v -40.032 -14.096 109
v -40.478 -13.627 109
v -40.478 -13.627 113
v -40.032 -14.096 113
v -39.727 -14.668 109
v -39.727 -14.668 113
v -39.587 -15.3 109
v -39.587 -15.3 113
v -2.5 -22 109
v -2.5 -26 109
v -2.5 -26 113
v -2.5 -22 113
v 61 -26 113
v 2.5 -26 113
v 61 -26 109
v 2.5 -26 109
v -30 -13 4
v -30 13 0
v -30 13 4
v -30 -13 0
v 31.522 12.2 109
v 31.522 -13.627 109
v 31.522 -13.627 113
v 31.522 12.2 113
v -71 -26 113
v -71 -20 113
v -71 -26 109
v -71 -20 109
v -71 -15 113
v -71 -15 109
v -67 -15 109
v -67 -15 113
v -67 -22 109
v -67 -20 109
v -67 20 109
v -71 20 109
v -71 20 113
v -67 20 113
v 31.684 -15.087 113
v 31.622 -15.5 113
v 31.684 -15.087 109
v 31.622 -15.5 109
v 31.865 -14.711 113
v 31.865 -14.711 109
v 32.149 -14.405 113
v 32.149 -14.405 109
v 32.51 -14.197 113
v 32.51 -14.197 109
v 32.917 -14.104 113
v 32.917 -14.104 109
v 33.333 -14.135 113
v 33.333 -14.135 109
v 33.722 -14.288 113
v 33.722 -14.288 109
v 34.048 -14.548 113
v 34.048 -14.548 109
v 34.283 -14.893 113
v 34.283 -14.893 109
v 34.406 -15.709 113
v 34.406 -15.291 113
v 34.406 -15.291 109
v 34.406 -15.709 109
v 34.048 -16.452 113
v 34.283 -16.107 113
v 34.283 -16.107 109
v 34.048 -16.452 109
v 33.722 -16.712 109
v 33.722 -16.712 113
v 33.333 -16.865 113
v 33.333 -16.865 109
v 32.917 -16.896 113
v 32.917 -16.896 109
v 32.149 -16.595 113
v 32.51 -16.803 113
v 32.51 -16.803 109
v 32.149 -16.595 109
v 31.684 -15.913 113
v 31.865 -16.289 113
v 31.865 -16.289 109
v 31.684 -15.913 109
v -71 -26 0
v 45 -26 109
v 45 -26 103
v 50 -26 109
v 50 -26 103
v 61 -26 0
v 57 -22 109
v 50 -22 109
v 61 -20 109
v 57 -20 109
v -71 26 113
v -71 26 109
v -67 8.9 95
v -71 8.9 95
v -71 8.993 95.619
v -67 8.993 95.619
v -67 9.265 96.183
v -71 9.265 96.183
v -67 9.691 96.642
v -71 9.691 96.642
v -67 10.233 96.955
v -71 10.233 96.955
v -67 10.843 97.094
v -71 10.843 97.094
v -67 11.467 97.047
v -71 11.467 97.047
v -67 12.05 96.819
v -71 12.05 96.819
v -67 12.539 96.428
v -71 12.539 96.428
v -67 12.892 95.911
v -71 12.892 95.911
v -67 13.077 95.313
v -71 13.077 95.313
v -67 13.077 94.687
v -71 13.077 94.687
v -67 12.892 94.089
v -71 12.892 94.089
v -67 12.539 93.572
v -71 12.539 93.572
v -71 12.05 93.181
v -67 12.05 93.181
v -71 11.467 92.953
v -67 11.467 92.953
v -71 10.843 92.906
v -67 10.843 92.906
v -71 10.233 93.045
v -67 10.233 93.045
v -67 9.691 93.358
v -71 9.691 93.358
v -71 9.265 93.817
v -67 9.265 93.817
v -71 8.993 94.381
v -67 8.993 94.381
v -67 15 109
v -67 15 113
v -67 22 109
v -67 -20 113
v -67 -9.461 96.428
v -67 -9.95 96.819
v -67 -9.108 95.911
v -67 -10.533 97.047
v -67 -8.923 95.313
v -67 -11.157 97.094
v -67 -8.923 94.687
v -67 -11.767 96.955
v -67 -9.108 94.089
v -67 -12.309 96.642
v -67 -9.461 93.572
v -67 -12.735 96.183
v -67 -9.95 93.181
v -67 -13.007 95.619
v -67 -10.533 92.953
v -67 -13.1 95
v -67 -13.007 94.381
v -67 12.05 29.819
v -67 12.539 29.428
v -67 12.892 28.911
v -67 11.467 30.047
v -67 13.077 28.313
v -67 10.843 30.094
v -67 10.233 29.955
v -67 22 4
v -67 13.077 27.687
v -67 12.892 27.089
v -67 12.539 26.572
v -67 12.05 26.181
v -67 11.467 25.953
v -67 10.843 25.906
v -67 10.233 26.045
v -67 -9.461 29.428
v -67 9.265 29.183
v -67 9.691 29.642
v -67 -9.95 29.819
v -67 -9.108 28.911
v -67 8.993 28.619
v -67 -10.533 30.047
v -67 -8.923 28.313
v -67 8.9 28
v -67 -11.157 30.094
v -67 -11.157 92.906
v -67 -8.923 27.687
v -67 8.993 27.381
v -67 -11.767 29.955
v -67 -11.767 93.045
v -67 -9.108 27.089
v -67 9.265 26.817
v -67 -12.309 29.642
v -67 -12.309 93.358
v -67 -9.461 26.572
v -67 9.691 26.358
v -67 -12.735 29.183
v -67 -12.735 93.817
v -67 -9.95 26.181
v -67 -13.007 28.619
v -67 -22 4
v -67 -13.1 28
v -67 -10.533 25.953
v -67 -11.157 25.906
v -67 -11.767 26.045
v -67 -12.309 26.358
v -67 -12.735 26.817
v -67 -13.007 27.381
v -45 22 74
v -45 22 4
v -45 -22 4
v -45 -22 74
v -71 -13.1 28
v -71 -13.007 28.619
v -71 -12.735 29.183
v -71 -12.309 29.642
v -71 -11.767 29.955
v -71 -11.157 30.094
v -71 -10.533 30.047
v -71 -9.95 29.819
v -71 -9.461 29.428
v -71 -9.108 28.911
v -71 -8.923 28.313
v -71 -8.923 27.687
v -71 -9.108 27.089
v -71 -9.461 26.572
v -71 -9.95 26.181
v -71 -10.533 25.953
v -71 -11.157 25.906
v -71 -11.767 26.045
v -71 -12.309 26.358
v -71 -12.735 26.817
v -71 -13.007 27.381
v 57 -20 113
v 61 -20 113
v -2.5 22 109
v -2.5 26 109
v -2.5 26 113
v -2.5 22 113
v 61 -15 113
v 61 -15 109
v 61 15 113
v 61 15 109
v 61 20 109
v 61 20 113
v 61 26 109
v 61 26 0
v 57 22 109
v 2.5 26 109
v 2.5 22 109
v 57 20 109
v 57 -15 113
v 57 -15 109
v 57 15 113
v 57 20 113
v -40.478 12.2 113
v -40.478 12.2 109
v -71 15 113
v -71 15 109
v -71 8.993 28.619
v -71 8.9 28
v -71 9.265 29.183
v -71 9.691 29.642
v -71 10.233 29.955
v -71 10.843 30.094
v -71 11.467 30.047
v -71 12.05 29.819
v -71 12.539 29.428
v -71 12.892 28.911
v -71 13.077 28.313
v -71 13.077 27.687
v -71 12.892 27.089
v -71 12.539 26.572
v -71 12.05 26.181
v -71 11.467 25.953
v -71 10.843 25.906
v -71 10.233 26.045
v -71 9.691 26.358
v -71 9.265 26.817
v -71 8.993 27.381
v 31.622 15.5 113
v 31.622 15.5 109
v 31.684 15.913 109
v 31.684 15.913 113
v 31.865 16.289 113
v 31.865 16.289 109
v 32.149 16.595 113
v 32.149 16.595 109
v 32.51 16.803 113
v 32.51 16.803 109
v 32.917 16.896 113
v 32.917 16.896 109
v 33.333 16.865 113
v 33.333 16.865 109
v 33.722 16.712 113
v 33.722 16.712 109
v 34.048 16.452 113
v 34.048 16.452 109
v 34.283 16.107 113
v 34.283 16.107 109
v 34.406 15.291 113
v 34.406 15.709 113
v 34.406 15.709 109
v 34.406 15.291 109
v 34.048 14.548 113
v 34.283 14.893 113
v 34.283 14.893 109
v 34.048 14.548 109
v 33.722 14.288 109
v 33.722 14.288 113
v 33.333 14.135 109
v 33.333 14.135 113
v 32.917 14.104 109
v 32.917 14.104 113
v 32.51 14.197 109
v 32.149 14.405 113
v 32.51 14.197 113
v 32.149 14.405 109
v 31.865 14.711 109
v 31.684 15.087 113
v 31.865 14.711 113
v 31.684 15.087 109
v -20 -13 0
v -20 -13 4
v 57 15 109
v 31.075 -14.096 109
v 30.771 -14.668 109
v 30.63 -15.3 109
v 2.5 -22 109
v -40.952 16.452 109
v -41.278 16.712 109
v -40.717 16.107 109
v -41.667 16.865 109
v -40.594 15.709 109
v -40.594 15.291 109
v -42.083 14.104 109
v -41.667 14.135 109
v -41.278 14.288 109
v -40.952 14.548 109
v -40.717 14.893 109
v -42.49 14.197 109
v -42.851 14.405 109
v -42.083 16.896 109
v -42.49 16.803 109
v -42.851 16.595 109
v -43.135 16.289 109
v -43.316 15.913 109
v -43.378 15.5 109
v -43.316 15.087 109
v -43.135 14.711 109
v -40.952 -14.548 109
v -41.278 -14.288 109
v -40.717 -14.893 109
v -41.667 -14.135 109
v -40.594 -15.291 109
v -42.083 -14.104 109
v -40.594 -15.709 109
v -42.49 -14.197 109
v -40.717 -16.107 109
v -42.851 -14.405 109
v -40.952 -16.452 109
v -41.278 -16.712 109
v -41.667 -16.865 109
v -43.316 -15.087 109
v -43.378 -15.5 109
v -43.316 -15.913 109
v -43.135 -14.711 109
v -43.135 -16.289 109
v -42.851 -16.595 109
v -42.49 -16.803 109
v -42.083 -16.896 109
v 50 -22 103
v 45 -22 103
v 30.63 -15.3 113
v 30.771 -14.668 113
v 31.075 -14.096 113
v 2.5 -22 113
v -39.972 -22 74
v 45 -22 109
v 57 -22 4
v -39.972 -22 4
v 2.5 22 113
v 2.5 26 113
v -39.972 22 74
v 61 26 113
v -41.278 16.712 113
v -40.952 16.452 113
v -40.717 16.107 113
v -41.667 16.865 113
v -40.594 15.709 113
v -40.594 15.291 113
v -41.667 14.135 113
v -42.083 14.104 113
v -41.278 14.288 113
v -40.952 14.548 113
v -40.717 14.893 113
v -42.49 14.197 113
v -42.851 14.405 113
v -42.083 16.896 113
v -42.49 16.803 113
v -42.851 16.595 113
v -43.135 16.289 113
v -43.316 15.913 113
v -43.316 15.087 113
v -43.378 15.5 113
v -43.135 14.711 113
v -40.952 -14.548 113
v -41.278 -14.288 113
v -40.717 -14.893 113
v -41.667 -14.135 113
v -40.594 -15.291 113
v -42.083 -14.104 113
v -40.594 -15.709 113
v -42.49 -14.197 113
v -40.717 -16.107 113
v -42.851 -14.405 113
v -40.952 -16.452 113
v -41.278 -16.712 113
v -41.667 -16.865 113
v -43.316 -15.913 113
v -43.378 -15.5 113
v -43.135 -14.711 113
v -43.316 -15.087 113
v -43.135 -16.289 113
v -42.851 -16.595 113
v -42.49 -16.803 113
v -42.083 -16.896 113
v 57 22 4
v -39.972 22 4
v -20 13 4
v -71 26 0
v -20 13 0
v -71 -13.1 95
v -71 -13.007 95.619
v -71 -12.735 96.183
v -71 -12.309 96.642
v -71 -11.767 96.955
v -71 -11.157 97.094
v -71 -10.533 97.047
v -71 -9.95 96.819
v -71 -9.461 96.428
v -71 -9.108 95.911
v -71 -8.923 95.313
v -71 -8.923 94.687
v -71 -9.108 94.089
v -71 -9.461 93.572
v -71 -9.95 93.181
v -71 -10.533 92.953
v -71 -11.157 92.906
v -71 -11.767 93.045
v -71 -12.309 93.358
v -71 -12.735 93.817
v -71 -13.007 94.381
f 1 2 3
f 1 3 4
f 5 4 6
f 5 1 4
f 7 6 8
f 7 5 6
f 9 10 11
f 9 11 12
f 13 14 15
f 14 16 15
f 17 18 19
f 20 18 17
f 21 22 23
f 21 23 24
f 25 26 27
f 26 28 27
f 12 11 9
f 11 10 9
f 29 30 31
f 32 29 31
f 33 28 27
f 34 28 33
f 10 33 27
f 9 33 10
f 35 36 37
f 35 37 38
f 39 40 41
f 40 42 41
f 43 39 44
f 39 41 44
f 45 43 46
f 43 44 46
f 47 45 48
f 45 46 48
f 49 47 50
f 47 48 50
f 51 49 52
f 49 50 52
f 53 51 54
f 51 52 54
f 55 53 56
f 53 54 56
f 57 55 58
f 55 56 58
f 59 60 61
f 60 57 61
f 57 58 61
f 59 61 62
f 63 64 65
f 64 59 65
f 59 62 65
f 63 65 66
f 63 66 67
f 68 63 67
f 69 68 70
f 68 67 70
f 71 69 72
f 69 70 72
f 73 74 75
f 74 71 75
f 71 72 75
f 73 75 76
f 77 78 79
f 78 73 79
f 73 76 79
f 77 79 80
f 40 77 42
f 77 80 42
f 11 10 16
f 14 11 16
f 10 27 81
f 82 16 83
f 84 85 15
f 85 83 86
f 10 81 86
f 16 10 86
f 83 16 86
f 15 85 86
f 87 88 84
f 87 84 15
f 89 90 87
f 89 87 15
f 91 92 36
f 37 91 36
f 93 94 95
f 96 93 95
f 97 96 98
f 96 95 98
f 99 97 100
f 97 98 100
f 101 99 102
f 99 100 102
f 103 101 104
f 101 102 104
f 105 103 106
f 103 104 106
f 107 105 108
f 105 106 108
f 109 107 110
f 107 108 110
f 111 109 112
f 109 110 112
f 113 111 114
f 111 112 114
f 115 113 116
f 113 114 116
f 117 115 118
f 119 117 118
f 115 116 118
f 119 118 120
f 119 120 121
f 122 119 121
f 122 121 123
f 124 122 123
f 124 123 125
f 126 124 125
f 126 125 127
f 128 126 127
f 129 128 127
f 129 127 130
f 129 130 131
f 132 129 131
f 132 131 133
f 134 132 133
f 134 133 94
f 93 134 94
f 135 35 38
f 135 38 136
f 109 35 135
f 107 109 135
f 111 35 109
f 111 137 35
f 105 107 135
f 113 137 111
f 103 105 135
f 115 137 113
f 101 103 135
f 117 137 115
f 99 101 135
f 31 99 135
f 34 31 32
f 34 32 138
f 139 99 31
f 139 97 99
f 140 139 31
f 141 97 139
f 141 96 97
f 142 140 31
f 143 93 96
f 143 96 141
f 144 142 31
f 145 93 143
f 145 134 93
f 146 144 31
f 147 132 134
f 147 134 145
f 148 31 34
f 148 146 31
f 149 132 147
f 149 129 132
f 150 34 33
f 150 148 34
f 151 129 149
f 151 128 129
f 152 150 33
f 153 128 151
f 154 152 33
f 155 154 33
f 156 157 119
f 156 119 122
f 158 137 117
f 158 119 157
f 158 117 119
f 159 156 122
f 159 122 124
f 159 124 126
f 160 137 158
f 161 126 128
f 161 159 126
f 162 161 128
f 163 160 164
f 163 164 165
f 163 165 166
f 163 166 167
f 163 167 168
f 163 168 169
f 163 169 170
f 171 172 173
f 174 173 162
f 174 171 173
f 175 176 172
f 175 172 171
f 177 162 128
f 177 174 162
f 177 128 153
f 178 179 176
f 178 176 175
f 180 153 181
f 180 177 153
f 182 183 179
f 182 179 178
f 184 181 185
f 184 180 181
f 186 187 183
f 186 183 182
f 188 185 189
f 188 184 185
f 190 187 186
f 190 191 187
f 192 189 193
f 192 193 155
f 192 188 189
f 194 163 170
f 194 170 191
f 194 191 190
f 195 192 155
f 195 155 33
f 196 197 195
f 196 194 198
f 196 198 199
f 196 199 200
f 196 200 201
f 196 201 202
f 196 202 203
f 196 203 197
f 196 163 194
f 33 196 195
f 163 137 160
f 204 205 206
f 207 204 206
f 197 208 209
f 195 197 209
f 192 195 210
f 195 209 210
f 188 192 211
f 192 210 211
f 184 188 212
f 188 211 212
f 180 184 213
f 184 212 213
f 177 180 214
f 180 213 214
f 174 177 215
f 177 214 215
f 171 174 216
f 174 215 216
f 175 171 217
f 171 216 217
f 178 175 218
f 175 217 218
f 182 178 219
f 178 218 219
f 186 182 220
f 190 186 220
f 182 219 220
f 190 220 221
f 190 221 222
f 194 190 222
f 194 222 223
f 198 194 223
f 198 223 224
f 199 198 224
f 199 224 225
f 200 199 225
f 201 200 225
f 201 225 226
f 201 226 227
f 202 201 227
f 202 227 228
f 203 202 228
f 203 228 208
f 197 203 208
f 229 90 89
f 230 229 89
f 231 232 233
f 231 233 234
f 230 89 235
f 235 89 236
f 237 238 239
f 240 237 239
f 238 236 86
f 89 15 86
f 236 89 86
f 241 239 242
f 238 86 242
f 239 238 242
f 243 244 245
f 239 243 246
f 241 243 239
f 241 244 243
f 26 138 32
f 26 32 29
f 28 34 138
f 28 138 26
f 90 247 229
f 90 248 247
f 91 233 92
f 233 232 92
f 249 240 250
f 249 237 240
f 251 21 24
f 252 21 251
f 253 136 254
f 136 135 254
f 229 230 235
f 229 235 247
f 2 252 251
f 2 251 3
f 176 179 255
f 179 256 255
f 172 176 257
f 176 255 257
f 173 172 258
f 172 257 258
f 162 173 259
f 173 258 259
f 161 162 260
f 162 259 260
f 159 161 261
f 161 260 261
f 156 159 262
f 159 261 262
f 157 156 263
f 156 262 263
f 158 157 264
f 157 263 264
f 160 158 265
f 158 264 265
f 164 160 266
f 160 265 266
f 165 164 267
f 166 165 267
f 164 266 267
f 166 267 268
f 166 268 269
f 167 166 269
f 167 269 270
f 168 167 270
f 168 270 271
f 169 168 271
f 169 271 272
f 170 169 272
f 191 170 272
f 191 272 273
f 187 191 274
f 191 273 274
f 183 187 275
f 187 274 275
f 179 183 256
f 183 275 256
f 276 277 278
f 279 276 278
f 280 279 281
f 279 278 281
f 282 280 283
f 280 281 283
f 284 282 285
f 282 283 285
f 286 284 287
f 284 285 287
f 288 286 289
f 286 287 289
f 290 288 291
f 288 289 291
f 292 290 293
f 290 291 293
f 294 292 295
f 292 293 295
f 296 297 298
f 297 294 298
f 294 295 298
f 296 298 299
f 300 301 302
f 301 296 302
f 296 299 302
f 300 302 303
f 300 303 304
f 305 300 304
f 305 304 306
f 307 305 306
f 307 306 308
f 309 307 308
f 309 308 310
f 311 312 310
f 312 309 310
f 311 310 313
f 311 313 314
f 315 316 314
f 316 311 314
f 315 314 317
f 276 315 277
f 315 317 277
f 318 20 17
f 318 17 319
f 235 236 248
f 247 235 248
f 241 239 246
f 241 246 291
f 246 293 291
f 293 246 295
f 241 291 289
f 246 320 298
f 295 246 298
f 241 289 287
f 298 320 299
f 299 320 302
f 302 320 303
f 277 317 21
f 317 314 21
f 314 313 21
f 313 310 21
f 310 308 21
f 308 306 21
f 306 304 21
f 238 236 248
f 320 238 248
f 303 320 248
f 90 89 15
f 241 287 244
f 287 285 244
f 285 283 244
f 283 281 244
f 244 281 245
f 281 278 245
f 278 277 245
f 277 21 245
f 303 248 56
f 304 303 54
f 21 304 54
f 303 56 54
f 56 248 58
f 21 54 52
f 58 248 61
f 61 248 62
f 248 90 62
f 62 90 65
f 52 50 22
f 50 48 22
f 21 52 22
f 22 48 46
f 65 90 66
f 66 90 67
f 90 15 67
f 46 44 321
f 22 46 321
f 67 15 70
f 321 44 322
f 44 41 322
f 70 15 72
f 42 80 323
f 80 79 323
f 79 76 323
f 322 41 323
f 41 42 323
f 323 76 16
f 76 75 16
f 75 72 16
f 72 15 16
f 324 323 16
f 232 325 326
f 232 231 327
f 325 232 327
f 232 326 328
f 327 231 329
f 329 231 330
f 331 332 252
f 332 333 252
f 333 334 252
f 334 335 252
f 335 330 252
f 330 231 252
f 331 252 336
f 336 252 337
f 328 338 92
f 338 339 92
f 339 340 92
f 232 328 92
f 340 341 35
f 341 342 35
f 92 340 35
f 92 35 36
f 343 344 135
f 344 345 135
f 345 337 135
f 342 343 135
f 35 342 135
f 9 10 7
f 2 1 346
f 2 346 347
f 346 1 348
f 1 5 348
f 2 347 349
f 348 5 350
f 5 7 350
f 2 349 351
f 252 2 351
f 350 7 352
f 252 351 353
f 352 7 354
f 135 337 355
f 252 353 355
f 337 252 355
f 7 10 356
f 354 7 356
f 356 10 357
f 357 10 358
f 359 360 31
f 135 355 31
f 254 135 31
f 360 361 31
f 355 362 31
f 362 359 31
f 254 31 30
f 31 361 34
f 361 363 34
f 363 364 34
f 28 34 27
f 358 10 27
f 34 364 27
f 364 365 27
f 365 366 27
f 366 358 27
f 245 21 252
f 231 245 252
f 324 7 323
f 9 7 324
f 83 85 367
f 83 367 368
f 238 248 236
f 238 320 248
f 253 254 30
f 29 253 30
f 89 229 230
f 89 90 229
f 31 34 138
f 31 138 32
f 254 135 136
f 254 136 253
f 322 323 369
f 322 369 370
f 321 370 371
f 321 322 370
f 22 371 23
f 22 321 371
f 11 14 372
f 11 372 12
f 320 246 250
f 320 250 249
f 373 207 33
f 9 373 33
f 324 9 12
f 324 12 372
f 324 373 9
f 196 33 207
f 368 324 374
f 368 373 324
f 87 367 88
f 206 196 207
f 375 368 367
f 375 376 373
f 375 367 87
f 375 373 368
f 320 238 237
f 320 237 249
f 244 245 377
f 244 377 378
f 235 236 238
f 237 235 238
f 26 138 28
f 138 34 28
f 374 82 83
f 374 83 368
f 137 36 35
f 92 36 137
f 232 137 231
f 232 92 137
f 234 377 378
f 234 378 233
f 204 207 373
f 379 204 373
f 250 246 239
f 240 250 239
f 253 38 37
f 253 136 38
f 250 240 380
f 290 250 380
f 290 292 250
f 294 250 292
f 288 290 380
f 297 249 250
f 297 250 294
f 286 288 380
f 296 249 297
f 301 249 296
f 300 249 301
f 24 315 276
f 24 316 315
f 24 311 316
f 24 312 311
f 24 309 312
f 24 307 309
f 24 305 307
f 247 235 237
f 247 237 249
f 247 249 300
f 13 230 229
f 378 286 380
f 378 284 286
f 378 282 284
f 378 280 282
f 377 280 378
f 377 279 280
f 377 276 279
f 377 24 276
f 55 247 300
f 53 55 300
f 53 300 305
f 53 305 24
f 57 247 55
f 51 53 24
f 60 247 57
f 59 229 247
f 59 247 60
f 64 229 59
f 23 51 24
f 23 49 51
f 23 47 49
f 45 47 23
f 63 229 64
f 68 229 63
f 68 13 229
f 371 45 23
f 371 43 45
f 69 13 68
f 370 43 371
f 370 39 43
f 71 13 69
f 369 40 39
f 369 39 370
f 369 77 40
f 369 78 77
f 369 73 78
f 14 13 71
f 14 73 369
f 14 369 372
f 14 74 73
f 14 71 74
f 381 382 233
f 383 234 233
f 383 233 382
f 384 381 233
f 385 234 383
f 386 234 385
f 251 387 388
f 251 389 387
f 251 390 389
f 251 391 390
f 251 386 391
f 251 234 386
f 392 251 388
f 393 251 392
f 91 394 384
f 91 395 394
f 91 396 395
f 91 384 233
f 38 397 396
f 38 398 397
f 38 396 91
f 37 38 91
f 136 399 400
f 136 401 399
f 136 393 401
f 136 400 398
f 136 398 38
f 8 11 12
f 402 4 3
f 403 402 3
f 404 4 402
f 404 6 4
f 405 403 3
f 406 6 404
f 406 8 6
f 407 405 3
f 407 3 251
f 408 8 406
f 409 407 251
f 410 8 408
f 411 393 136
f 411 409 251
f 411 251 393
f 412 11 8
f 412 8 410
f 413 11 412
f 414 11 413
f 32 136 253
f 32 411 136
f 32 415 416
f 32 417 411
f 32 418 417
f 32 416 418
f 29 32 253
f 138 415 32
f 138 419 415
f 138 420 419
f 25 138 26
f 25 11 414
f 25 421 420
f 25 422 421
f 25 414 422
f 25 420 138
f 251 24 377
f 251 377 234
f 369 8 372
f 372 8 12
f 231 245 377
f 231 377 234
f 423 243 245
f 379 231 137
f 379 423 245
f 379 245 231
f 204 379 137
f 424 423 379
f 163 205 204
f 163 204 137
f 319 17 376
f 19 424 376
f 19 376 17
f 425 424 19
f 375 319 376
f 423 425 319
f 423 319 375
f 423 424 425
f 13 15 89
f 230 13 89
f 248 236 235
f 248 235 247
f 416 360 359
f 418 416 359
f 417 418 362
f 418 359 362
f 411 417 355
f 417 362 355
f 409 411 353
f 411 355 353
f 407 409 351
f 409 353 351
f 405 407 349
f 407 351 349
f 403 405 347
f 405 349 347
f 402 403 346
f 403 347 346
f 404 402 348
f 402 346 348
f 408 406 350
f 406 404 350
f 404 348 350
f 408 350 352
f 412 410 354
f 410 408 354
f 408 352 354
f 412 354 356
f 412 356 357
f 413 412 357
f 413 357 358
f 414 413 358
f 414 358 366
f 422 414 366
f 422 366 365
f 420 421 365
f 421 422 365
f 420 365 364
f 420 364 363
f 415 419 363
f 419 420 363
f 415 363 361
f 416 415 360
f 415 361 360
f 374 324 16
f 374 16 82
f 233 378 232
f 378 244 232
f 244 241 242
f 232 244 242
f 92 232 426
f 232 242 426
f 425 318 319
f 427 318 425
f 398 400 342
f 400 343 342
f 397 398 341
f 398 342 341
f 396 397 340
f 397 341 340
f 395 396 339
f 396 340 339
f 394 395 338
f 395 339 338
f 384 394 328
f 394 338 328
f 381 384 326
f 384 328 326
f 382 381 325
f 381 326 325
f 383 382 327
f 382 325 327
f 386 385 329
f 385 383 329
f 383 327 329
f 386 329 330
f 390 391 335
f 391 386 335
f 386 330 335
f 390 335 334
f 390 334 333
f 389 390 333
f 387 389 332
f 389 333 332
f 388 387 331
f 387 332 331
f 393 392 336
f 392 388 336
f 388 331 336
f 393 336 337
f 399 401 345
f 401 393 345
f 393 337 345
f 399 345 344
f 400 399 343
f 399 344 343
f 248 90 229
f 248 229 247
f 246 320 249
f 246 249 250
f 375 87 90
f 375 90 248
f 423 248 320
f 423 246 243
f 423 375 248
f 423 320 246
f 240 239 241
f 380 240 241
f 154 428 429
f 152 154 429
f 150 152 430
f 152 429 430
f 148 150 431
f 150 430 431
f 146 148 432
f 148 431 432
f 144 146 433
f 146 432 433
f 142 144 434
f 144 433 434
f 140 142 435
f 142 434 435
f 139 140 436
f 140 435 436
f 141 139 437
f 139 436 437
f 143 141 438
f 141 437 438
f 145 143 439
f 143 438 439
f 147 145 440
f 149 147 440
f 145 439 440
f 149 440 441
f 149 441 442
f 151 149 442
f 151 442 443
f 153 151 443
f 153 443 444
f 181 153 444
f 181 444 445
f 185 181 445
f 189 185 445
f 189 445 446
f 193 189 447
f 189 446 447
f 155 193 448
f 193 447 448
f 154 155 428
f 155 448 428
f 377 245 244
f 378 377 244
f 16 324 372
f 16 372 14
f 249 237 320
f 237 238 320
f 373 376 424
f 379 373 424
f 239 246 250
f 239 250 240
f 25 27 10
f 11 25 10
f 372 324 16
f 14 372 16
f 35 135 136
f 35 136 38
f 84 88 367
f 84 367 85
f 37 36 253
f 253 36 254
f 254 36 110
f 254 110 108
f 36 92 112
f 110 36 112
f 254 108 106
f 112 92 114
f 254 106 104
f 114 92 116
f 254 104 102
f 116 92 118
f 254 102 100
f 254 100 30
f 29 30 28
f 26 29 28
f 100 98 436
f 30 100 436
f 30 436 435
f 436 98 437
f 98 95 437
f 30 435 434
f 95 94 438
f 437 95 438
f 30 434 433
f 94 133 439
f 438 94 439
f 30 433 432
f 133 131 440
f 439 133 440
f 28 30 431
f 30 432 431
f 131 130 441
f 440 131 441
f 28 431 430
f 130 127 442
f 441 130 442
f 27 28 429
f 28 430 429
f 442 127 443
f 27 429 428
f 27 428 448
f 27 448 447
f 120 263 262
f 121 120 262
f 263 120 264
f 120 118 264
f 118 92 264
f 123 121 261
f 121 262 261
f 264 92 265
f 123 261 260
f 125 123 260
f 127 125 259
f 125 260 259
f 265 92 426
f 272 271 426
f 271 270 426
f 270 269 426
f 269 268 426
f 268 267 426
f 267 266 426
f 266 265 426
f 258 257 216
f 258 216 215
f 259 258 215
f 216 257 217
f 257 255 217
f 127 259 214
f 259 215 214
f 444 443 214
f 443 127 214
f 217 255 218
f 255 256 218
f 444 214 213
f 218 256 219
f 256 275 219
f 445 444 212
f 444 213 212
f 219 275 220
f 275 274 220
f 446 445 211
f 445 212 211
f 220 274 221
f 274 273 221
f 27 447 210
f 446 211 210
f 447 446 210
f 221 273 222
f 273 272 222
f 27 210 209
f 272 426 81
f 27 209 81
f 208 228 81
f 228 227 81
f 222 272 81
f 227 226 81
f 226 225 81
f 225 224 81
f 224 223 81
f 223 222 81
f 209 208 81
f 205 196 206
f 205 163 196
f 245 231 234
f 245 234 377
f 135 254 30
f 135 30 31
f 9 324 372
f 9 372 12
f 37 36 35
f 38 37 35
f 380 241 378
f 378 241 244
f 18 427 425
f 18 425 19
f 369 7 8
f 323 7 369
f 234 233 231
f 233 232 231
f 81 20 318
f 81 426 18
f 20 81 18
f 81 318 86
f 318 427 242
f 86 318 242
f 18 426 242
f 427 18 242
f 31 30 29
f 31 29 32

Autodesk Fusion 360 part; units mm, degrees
sketch "Sketch1" plane through (0, 0, 0) normal (0, 0, 1) x (1, 0, 0)
  line L0 (-40, 18) -> (40, 18)
  circle A0 centre (37.5, -15.5) radius 2.4
  line L1 (36, -15.3) -> (36, 12.2)
  circle A1 centre (-37.5, 15.5) radius 1.4
  circle A2 centre (-37.5, -15.5) radius 1.4
  line L2 (36, 12.2) -> (-36, 12.2)
  circle A3 centre (-37.5, -15.5) radius 2.4
  line L3 (-33.5216, 18) -> (8, 18)
  line L4 (40, 18) -> (40, -18)
  line L5 (-36, 12.2) -> (-36, -15.3)
  circle A4 centre (37.5, 15.5) radius 1.4
  circle A5 centre (-37.5, 15.5) radius 2.4
  circle A6 centre (37.5, -15.5) radius 1.4
  line L6 (-33.5216, 14) -> (-33.5216, 18)
  line L7 (40, -18) -> (-40, -18)
  line L8 (8, 18) -> (8, 14)
  line L9 (8, 14) -> (-33.5216, 14)
  line L10 (-36, -15.3) -> (36, -15.3)
  circle A7 centre (37.5, 15.5) radius 2.4
  line L11 (-40, -18) -> (-40, 18)
  dimension "d1" = 2.8
  dimension "d2" = 4.8
  dimension "d3" = 2.8
  dimension "d4" = 4.8
  dimension "d5" = 2.8
  dimension "d6" = 4.8
  dimension "d7" = 2.8
  dimension "d8" = 4.8
sketch "Sketch2" plane through (0, 0, 0) normal (0, 0, 1) x (1, 0, 0)
  line L0 (55, 20) -> (-5, 20)
  line L1 (-5, 20) -> (-5, -20)
  line L2 (-5, -20) -> (55, -20)
  line L3 (55, -20) -> (55, 20)
  line L4 (61, 26) -> (-71, 26)
  line L5 (-71, 26) -> (-71, -26)
  line L6 (-71, -26) -> (61, -26)
  line L7 (61, -26) -> (61, 26)
  line L8 (57, 22) -> (-67, 22)
  line L9 (-67, 22) -> (-67, -22)
  line L10 (-67, -22) -> (57, -22)
  line L11 (57, -22) -> (57, 22)
  line L12 (-39.9718, 26) -> (-45, 26)
  line L13 (-45, 26) -> (-45, -26)
  line L14 (-45, -26) -> (-39.9718, -26)
  line L15 (-39.9718, -26) -> (-39.9718, 26)
  line L16 (-20, 13) -> (-30, 13)
  line L17 (-30, 13) -> (-30, -13)
  line L18 (-30, -13) -> (-20, -13)
  line L19 (-20, -13) -> (-20, 13)
  dimension "d15" = 60
  dimension "d16" = 40
  dimension "d19" = 132
  dimension "d20" = 52
  dimension "d22" = 26
extrude "Extrude1" add sketch "Sketch2" along normal blind 4 contours L0 L1 L2 L3 | L4 L6 L7 L8 L10 L11 L15 | L4 L8 L12 L13 L15 | L4 L5 L6 L8 L9 L10 L13 | L8 L10 L13 L15 | L8 L10 L11 L15 | L6 L10 L13 L14 L15 | L8 L9 L10 L13 | L16 L17 L18 L19 makes body 1
extrude "Extrude2" add sketch "Sketch2" along normal blind 109 contours L4 L6 L7 L8 L10 L11 L15 | L4 L8 L12 L13 L15 | L4 L5 L6 L8 L9 L10 L13 | L6 L10 L13 L14 L15 bodies 1
extrude "Extrude3" add sketch "Sketch2" along normal blind 74 contours L8 L10 L13 L15 bodies 1
sketch "Sketch3" plane through (-71, 0, 0) normal (-1, 0, 0) x (0, -1, 0)
  line L0 (-26, 0) -> (26, 0)
  line L1 (26, 0) -> (26, 109)
  line L2 (26, 109) -> (-26, 109)
  line L3 (-26, 109) -> (-26, 0)
  line L4 (-11, 95) -> (11, 95)
  line L5 (11, 95) -> (11, 28)
  line L6 (11, 28) -> (-11, 28)
  line L7 (-11, 28) -> (-11, 95)
  circle A0 centre (-11, 28) radius 2.1
  circle A1 centre (-11, 95) radius 2.1
  circle A2 centre (11, 95) radius 2.1
  circle A3 centre (11, 28) radius 2.1
  dimension "d31" = 22
  dimension "d32" = 67
  dimension "d33" = 4.2
  dimension "d34" = 4.2
  dimension "d35" = 4.2
  dimension "d36" = 4.2
sketch "Sketch4" plane through (0, 0, 109) normal (0, 0, 1) x (-1, 0, 0)
  line L0 (-57, -22) -> (-57, 22)
  line L1 (-57, 22) -> (67, 22)
  line L2 (67, 22) -> (67, -22)
  line L3 (67, -22) -> (-57, -22)
  line L4 (71, 26) -> (-61, 26)
  line L5 (-61, 26) -> (-61, -26)
  line L6 (-61, -26) -> (71, -26)
  line L7 (71, -26) -> (71, 26)
  line L8 (-61, 26) -> (71, 26)
  line L9 (71, 26) -> (71, -26)
  line L10 (71, -26) -> (-61, -26)
  line L11 (-61, -26) -> (-61, 26)
  line L12 (67, 20) -> (71, 20)
  line L13 (71, 20) -> (71, 15)
  line L14 (71, 15) -> (67, 15)
  line L15 (67, 15) -> (67, 20)
  line L16 (71, -20) -> (67, -20)
  line L17 (67, -20) -> (67, -15)
  line L18 (67, -15) -> (71, -15)
  line L19 (71, -15) -> (71, -20)
  line L20 (-57, 20) -> (-61, 20)
  line L21 (-61, 20) -> (-61, 15)
  line L22 (-61, 15) -> (-57, 15)
  line L23 (-57, 15) -> (-57, 20)
  line L24 (-57, -20) -> (-61, -20)
  line L25 (-61, -20) -> (-61, -15)
  line L26 (-61, -15) -> (-57, -15)
  line L27 (-57, -15) -> (-57, -20)
  line L28 (2.5, -22) -> (-2.5, -22)
  line L29 (-2.5, -22) -> (-2.5, -26)
  line L30 (-2.5, -26) -> (2.5, -26)
  line L31 (2.5, -26) -> (2.5, -22)
  line L32 (2.5, 22) -> (-2.5, 22)
  line L33 (-2.5, 22) -> (-2.5, 26)
  line L34 (-2.5, 26) -> (2.5, 26)
  line L35 (2.5, 26) -> (2.5, 22)
  circle A0 centre (-33.0216, 15.5) radius 2.4
  line L36 (-35.5216, -18) -> (-35.5216, 18)
  circle A1 centre (-33.0216, -15.5) radius 2.4
  line L37 (38, -14) -> (38, -18)
  line L38 (-31.5216, -12.2) -> (40.4784, -12.2)
  line L39 (44.4784, -18) -> (-35.5216, -18)
  line L40 (38, -18) -> (-3.5216, -18)
  line L41 (-3.5216, -18) -> (-3.5216, -14)
  circle A2 centre (-33.0216, 15.5) radius 1.4
  line L42 (-31.5216, 15.3) -> (-31.5216, -12.2)
  circle A3 centre (-33.0216, -15.5) radius 1.4
  line L43 (44.4784, 18) -> (44.4784, -18)
  circle A4 centre (41.9784, 15.5) radius 2.4
  line L44 (40.4784, 15.3) -> (-31.5216, 15.3)
  circle A5 centre (41.9784, 15.5) radius 1.4
  circle A6 centre (41.9784, -15.5) radius 2.4
  line L45 (40.4784, -12.2) -> (40.4784, 15.3)
  line L46 (-35.5216, 18) -> (44.4784, 18)
  circle A7 centre (41.9784, -15.5) radius 1.4
  line L47 (-3.5216, -14) -> (38, -14)
  line L48 (-50, 26) -> (-45, 26)
  line L49 (-45, 26) -> (-45, 22)
  line L50 (-45, 22) -> (-50, 22)
  line L51 (-50, 22) -> (-50, 26)
  point P0 (4.4784, 0)
  point P1 (4.4784, 0)
  dimension "d37" = 5
  dimension "d38" = 4
  dimension "d39" = 5
  dimension "d44" = 2.8
  dimension "d45" = 4.8
  dimension "d46" = 2.8
  dimension "d47" = 4.8
  dimension "d48" = 2.8
  dimension "d49" = 4.8
  dimension "d50" = 2.8
  dimension "d51" = 4.8
extrude "Extrude4" add sketch "Sketch4" along normal blind 4 contours L0 L5 L11 L24 L25 L26 L27 | L3 L6 L10 L28 L29 L30 L31 | L0 L5 L11 L20 L21 L22 L23 | L2 L7 L9 L16 L17 L18 L19 | L2 L7 L9 L12 L13 L14 L15 | L1 L4 L8 L32 L33 L34 L35 bodies 1
extrude "Extrude5" cut sketch "Sketch2" along normal blind 4 contours L16 L17 L18 L19 bodies 1
extrude "Extrude6" cut sketch "Sketch4" against normal blind 6 contours L1 L4 L8 L48 L49 L50 L51 bodies 1
extrude "Extrude7" add sketch "Sketch4" along normal blind 4 separate body contours L0 L3 L5 L6 L10 L11 L24 L29 | L0 L1 L2 L3 L15 L17 L23 L27 L28 L32 L50 | L0 L5 L11 L22 L26 | L2 L3 L6 L7 L9 L10 L16 L31 | L0 L1 L4 L5 L8 L11 L20 L51 | L2 L7 L9 L14 L18 | L1 L4 L8 L48 L49 L50 L51 | L1 L4 L8 L33 L49 | L1 L2 L4 L7 L8 L9 L12 L35 | A0 L42 L44 | A0 L42 L44 | A4 L44 L45 | A4 L44 L45 | L36 L37 L39 L41 L43 L46 L47 | L37 L39 L40 L41 L47 | A1 | A6 makes body 2
extrude "Extrude8" cut sketch "Sketch3" against normal blind 4 contours L4 L7 A1 | L4 L7 A1 | L4 L5 A2 | L4 L5 A2 | L6 L7 A0 | L6 L7 A0 | L5 L6 A3 | L5 L6 A3 bodies 1
equation "d19 = 126 mm + 6 mm"
equation "d20 = 46 mm + 6 mm"
equation "d25 = 80 mm + 4 mm + 25 mm"
equation "d27 = 70 mm + 4 mm"
